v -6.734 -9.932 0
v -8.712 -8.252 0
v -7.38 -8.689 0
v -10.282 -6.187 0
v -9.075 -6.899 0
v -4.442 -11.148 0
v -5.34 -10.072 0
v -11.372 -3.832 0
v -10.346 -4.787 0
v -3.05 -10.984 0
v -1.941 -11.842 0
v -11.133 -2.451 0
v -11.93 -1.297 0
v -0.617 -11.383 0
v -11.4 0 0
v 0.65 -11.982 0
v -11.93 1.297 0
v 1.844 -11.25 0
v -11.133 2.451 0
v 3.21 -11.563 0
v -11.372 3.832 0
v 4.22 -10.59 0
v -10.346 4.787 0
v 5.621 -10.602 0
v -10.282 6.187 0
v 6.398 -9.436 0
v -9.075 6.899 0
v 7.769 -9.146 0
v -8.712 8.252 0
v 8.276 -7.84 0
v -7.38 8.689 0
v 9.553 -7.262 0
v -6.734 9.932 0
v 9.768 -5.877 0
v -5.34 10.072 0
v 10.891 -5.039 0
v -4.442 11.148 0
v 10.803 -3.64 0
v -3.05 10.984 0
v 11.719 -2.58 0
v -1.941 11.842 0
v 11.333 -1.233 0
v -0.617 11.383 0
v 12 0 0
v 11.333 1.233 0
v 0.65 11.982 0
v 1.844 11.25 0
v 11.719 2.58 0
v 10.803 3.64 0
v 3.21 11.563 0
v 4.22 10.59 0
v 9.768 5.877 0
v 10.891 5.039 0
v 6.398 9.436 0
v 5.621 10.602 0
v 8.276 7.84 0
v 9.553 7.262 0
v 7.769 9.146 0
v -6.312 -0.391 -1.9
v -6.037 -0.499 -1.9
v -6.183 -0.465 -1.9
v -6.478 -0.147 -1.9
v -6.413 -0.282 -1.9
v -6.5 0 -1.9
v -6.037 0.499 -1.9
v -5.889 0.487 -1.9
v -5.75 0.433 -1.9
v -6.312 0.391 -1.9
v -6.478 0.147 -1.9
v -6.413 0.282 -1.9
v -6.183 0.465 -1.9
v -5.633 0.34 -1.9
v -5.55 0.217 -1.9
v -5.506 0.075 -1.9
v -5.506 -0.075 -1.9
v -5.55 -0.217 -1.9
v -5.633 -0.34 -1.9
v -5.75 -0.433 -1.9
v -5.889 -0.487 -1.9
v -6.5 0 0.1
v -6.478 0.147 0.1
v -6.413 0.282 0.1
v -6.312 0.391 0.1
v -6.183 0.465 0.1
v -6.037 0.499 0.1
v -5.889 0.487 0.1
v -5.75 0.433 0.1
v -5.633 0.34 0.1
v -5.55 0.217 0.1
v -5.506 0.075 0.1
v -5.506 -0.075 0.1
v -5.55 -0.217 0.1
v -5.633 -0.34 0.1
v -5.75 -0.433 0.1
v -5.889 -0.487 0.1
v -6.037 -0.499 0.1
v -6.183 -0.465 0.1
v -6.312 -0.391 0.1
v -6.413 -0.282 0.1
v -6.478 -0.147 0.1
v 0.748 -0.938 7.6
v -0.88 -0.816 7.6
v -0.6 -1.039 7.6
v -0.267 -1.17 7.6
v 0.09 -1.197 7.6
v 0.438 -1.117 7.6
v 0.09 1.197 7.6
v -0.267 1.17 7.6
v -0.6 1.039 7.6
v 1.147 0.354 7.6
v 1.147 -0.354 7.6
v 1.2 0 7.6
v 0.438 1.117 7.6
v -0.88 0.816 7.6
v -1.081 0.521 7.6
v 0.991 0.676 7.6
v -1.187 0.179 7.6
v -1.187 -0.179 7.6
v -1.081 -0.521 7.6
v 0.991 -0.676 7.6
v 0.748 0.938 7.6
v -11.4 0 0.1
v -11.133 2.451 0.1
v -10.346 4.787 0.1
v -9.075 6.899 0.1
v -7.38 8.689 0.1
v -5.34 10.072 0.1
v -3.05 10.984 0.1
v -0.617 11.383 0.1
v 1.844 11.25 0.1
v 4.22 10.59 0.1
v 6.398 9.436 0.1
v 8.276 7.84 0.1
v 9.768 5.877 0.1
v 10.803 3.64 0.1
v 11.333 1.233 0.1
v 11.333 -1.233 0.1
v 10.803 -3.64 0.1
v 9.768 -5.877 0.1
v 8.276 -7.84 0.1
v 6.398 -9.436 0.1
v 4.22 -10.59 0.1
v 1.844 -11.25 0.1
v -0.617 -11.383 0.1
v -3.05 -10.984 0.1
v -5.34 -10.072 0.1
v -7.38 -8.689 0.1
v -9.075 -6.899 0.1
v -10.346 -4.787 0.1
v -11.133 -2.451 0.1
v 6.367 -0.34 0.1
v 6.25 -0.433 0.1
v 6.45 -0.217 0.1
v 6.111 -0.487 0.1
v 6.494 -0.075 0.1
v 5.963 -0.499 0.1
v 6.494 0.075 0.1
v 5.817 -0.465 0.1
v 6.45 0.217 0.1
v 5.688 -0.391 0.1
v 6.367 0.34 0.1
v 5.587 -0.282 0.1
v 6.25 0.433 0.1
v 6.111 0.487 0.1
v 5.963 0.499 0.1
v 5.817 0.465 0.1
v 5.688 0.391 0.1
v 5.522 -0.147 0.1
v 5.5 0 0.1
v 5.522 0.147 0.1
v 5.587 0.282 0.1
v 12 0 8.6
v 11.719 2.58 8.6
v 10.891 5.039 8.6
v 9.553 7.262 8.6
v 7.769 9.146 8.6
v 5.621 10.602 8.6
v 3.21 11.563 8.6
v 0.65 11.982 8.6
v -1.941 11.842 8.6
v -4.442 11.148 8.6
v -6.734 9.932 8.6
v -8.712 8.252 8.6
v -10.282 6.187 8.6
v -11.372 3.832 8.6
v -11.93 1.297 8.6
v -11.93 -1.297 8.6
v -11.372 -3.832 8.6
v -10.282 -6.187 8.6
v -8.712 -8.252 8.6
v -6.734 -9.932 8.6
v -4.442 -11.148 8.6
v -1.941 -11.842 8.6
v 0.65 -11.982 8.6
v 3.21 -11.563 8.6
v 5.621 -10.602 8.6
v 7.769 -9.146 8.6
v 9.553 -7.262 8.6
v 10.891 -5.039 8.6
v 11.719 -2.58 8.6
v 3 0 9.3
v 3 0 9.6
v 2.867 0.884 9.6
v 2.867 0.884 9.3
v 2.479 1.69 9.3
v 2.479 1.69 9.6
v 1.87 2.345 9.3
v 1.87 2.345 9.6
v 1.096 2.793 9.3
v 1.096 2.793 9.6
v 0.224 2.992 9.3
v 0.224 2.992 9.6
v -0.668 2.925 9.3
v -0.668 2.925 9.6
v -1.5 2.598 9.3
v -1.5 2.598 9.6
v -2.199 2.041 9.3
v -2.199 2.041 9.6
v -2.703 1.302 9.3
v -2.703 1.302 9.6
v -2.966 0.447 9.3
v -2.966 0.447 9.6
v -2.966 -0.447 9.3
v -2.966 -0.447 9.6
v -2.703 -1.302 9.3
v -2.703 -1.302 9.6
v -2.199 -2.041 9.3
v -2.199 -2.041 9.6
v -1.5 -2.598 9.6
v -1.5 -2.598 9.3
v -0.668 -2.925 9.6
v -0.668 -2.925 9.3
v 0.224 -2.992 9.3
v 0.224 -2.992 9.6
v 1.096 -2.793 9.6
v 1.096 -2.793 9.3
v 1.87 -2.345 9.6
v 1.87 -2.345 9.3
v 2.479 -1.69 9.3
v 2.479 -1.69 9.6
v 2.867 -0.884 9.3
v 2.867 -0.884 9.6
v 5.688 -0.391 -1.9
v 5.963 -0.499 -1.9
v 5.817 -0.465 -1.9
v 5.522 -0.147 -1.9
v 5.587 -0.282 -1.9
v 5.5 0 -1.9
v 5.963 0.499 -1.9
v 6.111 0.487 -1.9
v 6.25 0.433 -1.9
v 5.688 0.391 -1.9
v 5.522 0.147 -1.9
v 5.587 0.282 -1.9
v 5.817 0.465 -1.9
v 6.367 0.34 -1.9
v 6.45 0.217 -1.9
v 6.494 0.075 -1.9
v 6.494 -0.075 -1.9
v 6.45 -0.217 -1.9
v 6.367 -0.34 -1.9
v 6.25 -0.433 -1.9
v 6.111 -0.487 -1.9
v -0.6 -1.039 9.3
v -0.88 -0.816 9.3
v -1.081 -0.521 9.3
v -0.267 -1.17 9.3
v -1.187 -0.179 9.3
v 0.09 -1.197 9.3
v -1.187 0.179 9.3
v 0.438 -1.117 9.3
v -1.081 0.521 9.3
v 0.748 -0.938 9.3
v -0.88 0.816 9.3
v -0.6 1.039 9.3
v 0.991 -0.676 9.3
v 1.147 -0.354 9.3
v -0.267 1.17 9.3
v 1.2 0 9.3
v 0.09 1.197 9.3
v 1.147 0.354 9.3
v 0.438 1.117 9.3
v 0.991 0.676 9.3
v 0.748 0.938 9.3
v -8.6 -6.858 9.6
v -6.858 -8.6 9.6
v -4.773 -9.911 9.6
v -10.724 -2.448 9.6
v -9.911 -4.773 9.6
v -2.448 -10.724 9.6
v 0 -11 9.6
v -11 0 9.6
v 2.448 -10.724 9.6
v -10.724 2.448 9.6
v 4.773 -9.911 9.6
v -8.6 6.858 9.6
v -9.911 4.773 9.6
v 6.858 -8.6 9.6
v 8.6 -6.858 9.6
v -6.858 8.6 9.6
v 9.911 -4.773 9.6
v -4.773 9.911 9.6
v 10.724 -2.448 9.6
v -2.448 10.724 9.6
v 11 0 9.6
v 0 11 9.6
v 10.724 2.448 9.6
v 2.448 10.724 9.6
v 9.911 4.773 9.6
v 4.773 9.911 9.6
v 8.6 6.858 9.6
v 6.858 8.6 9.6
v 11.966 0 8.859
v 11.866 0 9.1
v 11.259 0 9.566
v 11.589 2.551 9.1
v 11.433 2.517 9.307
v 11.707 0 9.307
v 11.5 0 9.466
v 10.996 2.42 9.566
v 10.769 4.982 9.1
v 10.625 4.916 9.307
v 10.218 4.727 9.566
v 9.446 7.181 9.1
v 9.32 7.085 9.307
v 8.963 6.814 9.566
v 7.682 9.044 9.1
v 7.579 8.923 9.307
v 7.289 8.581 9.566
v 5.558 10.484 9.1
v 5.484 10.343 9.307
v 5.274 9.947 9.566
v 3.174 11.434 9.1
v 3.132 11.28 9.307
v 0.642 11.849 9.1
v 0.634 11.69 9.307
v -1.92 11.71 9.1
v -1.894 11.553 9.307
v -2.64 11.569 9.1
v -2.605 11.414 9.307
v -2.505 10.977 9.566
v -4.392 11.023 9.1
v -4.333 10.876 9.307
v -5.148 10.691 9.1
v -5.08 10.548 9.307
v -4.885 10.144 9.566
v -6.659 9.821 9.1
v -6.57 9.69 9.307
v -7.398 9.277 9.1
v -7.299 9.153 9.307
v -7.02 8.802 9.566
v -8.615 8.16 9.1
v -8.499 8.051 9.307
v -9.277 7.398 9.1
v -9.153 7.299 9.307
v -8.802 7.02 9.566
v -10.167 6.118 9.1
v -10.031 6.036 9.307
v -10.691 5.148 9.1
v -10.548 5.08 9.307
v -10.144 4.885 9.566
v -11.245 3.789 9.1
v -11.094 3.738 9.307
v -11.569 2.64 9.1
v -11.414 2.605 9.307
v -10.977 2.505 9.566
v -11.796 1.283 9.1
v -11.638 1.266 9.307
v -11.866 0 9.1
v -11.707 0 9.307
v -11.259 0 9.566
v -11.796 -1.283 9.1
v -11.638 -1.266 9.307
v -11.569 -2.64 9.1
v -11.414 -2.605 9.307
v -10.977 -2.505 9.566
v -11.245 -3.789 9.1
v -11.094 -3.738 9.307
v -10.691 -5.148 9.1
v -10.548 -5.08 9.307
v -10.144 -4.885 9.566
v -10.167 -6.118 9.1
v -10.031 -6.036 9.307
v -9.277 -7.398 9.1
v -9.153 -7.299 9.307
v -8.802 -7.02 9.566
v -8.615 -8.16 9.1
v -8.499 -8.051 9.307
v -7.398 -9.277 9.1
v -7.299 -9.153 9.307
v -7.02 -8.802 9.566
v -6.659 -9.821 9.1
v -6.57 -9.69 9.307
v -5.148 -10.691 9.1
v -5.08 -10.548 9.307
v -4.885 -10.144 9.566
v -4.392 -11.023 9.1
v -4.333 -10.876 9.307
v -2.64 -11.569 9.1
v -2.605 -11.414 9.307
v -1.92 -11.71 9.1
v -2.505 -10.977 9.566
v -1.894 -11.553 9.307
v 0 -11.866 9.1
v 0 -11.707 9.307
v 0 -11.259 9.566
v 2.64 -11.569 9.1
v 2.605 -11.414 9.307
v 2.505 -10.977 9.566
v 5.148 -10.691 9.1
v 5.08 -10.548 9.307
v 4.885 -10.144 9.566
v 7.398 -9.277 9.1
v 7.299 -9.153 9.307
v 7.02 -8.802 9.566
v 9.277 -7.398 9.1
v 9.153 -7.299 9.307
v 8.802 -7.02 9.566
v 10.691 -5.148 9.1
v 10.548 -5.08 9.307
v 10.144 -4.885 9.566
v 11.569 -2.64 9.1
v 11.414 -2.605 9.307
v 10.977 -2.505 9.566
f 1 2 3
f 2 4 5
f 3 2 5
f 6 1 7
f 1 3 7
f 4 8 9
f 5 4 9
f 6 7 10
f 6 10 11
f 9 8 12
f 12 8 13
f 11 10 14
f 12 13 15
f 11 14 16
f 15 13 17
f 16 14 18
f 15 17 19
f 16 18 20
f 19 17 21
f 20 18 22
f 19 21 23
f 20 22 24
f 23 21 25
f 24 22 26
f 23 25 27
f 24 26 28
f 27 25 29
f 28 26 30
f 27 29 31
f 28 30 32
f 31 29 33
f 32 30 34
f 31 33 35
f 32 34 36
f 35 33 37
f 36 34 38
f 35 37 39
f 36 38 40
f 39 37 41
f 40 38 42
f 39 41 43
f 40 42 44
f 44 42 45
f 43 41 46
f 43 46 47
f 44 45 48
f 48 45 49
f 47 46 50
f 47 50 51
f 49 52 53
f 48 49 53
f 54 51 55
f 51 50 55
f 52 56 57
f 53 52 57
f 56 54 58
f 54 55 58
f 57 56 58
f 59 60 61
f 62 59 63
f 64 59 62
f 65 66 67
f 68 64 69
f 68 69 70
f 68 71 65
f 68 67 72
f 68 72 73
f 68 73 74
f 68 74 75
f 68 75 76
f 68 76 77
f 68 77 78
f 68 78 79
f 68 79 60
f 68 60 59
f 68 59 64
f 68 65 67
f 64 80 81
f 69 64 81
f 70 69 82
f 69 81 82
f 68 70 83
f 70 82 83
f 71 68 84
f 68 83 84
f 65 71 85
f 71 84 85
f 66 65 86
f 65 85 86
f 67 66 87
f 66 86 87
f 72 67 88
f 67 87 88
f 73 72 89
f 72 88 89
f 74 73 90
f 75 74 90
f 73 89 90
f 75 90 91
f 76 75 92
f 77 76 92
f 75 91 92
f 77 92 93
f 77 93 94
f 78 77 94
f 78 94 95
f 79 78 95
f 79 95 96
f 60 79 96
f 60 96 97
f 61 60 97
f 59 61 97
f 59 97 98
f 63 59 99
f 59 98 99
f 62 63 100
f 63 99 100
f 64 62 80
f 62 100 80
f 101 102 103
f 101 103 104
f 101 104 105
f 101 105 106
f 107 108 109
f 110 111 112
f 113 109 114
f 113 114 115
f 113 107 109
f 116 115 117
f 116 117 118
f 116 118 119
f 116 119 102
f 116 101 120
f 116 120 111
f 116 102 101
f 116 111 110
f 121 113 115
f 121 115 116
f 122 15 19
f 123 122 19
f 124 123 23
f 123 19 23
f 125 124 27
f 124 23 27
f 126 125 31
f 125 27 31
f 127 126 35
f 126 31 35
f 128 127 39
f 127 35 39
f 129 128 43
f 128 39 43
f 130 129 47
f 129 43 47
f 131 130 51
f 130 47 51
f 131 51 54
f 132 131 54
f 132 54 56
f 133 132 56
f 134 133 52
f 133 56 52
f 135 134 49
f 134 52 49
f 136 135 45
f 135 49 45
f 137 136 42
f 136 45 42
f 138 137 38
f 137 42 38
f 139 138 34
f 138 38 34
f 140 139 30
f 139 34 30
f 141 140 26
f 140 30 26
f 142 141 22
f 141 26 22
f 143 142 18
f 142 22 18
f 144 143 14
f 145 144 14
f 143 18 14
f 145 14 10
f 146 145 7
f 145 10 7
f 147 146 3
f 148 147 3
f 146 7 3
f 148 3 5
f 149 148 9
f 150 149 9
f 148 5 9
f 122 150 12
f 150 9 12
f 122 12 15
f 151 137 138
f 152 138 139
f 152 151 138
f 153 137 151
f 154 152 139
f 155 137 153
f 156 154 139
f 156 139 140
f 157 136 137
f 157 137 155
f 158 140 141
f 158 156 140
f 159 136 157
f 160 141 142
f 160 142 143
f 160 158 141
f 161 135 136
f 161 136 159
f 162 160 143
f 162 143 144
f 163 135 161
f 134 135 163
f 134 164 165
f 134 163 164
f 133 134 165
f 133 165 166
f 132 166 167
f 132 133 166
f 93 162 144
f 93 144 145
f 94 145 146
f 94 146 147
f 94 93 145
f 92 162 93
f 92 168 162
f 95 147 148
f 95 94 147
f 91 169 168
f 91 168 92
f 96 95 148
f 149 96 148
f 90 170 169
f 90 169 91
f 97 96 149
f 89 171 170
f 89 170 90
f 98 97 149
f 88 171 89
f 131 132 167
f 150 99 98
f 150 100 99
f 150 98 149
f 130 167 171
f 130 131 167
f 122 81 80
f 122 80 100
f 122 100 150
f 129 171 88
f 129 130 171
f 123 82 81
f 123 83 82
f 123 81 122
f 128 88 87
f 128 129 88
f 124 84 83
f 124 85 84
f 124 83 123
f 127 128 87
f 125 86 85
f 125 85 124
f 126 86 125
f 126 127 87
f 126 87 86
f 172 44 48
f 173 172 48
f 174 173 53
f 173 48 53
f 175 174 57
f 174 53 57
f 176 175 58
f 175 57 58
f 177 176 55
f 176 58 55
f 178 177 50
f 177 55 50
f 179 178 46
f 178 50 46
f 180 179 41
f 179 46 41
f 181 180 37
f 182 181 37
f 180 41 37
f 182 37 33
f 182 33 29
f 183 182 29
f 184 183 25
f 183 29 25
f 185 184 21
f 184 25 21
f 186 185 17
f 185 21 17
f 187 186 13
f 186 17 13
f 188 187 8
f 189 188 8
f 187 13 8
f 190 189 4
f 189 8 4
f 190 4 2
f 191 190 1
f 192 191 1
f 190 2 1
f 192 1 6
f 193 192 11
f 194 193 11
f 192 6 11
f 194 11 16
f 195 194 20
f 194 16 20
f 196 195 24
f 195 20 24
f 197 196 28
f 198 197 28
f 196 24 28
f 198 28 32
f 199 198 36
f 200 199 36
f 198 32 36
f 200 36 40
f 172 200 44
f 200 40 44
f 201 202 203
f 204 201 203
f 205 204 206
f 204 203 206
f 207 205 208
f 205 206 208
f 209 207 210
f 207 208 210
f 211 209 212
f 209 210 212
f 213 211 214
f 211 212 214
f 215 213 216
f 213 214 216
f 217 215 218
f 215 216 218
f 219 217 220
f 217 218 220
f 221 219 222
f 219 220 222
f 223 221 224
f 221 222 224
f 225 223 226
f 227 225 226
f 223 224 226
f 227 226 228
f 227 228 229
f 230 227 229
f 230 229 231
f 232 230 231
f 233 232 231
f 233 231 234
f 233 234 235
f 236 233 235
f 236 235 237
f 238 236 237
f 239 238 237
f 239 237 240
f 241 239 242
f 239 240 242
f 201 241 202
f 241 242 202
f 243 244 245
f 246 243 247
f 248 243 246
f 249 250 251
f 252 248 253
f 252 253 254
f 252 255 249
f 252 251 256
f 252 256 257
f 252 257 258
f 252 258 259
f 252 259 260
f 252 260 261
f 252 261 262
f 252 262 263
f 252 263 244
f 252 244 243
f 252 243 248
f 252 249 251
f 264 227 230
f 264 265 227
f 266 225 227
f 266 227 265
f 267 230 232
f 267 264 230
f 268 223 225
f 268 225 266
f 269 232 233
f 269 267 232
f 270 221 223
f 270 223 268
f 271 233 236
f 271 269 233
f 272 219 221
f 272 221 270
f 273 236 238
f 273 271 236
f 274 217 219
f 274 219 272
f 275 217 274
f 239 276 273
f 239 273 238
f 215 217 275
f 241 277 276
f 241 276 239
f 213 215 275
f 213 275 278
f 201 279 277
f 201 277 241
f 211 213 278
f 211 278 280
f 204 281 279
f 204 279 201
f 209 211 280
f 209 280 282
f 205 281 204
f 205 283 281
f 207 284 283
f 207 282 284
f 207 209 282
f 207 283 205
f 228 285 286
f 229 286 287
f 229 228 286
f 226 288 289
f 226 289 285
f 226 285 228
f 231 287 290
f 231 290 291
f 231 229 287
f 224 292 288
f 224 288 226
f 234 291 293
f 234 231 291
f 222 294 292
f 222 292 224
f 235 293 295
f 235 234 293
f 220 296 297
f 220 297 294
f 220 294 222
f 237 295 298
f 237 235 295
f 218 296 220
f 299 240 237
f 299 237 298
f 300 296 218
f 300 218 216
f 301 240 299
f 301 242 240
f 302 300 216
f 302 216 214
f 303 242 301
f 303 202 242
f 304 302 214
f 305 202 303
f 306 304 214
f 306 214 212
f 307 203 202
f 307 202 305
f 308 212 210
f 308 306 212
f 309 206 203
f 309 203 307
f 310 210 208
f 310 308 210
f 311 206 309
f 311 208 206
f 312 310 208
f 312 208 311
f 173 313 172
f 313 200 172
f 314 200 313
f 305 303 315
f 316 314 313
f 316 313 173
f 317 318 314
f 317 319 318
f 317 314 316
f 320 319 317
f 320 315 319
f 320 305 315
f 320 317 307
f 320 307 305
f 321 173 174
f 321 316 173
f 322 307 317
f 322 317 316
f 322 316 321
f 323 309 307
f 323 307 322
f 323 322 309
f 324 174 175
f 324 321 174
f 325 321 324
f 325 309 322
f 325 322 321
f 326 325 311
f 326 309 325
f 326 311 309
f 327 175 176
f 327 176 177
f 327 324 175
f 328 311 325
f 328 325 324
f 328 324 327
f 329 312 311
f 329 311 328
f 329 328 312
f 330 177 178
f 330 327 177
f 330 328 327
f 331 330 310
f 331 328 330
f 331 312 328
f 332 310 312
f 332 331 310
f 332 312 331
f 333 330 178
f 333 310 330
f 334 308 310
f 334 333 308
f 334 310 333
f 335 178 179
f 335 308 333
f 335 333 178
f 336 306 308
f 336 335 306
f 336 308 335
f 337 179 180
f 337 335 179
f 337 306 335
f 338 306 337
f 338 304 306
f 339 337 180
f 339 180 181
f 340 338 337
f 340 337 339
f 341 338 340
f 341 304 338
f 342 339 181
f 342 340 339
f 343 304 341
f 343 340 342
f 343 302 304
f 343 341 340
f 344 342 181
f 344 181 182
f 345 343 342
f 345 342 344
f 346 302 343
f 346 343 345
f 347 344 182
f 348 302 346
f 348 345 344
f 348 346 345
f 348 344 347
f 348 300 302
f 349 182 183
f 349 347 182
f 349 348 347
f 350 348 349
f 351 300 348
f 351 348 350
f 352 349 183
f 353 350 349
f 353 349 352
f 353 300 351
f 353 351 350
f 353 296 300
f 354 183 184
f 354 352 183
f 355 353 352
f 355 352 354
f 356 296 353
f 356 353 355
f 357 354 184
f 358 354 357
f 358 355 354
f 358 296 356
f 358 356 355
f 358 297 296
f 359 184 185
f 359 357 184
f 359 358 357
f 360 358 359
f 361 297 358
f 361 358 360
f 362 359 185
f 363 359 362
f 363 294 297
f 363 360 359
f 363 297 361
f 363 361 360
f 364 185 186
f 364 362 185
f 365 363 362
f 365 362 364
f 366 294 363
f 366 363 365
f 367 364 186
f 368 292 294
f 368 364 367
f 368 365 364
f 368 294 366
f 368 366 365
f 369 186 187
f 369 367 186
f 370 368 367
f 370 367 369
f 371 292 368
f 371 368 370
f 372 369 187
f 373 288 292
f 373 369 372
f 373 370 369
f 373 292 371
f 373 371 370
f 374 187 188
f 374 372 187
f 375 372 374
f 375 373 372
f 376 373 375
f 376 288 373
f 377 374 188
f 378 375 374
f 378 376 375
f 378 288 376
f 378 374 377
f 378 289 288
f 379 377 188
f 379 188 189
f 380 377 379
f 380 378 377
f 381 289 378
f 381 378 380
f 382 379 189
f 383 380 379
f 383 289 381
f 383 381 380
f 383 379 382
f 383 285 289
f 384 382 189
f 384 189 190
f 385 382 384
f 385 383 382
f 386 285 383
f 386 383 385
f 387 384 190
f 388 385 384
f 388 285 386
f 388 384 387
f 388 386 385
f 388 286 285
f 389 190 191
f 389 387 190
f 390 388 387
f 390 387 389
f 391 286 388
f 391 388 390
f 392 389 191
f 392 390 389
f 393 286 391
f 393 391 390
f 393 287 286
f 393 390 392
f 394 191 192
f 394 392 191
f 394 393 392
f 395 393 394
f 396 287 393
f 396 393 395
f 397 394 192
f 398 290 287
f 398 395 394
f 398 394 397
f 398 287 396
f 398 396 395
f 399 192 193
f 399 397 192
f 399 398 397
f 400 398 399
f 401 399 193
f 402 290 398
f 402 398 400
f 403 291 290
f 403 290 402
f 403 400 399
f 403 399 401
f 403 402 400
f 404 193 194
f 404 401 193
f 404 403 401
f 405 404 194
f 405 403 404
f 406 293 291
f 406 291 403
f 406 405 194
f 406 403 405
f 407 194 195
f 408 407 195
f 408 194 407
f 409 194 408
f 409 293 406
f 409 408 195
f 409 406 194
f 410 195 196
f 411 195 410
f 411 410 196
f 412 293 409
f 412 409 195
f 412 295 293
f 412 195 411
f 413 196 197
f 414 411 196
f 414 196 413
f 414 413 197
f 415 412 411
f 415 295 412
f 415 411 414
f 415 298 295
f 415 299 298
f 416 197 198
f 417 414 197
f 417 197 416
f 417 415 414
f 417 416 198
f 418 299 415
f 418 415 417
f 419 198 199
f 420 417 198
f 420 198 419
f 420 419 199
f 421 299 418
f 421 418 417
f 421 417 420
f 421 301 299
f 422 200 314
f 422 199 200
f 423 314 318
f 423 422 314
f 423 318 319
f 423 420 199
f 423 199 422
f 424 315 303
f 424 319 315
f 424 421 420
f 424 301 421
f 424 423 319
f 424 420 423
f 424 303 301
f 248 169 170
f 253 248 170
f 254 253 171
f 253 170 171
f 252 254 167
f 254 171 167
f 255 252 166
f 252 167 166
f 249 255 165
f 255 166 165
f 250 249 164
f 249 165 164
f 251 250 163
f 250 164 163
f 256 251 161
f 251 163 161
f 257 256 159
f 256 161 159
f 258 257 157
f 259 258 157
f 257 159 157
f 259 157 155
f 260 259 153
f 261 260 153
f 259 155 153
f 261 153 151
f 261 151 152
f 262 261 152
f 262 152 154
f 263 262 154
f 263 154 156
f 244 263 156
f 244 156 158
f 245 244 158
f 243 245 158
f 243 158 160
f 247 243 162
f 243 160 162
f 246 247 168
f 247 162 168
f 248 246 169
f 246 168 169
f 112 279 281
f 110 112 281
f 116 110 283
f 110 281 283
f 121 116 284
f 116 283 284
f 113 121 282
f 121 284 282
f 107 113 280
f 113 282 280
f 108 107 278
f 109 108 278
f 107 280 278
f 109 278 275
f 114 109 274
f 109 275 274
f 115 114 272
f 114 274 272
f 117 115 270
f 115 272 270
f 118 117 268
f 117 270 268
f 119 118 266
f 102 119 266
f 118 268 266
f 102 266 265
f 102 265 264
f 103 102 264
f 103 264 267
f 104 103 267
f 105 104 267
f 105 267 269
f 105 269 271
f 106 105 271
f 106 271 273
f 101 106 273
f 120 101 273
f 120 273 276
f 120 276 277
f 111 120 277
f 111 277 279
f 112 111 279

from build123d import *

# Parameters (mm, degrees)
ESBO_O1_R                = 12
RESSALTO_EXTRUS_O1_DEPTH = 9.6
ESBO_O2_R                = 11.4
CORTE_EXTRUS_O1_DEPTH    = 0.1
ESBO_O3_R                = 0.5
RESSALTO_EXTRUS_O2_DEPTH = 2
ESBO_O4_R                = 1.2
CORTE_EXTRUS_O2_DEPTH    = 2
ESBO_O5_R                = 3
CORTE_EXTRUS_O3_DEPTH    = 0.3
FILETE1_R                = 1


with BuildPart() as part:
    # Esboço1 → Ressalto-extrusão1 (new body)
    with BuildSketch(Plane.XY):
        Circle(ESBO_O1_R)
    extrude(amount=RESSALTO_EXTRUS_O1_DEPTH)

    # Esboço2 → Corte-extrusão1 (cut)
    with BuildSketch(Plane(origin=(0, 0, 0), x_dir=(-1, 0, 0), z_dir=(0, 0, -1))):
        Circle(ESBO_O2_R)
    extrude(amount=-CORTE_EXTRUS_O1_DEPTH, mode=Mode.SUBTRACT)

    # Esboço3 → Ressalto-extrusão2 (add)
    with BuildSketch(Plane(origin=(0, 0, 0.1), x_dir=(-1, 0, 0), z_dir=(0, 0, -1))):
        with Locations((6, 0)):
            Circle(ESBO_O3_R)
        with Locations((-6, 0)):
            Circle(ESBO_O3_R)
    extrude(amount=RESSALTO_EXTRUS_O2_DEPTH)

    # Esboço4 → Corte-extrusão2 (cut)
    with BuildSketch(Plane.XY.offset(9.6)):
        Circle(ESBO_O4_R)
    extrude(amount=-CORTE_EXTRUS_O2_DEPTH, mode=Mode.SUBTRACT)

    # Esboço5 → Corte-extrusão3 (cut)
    with BuildSketch(Plane.XY.offset(9.6)):
        Circle(ESBO_O5_R)
    extrude(amount=-CORTE_EXTRUS_O3_DEPTH, mode=Mode.SUBTRACT)

    # Filete1
    filete1_edges = [part.edges().sort_by_distance(p)[0] for p in [
        (-12, 0, 9.6),
    ]]
    fillet(filete1_edges, radius=FILETE1_R)


solid = part.part
